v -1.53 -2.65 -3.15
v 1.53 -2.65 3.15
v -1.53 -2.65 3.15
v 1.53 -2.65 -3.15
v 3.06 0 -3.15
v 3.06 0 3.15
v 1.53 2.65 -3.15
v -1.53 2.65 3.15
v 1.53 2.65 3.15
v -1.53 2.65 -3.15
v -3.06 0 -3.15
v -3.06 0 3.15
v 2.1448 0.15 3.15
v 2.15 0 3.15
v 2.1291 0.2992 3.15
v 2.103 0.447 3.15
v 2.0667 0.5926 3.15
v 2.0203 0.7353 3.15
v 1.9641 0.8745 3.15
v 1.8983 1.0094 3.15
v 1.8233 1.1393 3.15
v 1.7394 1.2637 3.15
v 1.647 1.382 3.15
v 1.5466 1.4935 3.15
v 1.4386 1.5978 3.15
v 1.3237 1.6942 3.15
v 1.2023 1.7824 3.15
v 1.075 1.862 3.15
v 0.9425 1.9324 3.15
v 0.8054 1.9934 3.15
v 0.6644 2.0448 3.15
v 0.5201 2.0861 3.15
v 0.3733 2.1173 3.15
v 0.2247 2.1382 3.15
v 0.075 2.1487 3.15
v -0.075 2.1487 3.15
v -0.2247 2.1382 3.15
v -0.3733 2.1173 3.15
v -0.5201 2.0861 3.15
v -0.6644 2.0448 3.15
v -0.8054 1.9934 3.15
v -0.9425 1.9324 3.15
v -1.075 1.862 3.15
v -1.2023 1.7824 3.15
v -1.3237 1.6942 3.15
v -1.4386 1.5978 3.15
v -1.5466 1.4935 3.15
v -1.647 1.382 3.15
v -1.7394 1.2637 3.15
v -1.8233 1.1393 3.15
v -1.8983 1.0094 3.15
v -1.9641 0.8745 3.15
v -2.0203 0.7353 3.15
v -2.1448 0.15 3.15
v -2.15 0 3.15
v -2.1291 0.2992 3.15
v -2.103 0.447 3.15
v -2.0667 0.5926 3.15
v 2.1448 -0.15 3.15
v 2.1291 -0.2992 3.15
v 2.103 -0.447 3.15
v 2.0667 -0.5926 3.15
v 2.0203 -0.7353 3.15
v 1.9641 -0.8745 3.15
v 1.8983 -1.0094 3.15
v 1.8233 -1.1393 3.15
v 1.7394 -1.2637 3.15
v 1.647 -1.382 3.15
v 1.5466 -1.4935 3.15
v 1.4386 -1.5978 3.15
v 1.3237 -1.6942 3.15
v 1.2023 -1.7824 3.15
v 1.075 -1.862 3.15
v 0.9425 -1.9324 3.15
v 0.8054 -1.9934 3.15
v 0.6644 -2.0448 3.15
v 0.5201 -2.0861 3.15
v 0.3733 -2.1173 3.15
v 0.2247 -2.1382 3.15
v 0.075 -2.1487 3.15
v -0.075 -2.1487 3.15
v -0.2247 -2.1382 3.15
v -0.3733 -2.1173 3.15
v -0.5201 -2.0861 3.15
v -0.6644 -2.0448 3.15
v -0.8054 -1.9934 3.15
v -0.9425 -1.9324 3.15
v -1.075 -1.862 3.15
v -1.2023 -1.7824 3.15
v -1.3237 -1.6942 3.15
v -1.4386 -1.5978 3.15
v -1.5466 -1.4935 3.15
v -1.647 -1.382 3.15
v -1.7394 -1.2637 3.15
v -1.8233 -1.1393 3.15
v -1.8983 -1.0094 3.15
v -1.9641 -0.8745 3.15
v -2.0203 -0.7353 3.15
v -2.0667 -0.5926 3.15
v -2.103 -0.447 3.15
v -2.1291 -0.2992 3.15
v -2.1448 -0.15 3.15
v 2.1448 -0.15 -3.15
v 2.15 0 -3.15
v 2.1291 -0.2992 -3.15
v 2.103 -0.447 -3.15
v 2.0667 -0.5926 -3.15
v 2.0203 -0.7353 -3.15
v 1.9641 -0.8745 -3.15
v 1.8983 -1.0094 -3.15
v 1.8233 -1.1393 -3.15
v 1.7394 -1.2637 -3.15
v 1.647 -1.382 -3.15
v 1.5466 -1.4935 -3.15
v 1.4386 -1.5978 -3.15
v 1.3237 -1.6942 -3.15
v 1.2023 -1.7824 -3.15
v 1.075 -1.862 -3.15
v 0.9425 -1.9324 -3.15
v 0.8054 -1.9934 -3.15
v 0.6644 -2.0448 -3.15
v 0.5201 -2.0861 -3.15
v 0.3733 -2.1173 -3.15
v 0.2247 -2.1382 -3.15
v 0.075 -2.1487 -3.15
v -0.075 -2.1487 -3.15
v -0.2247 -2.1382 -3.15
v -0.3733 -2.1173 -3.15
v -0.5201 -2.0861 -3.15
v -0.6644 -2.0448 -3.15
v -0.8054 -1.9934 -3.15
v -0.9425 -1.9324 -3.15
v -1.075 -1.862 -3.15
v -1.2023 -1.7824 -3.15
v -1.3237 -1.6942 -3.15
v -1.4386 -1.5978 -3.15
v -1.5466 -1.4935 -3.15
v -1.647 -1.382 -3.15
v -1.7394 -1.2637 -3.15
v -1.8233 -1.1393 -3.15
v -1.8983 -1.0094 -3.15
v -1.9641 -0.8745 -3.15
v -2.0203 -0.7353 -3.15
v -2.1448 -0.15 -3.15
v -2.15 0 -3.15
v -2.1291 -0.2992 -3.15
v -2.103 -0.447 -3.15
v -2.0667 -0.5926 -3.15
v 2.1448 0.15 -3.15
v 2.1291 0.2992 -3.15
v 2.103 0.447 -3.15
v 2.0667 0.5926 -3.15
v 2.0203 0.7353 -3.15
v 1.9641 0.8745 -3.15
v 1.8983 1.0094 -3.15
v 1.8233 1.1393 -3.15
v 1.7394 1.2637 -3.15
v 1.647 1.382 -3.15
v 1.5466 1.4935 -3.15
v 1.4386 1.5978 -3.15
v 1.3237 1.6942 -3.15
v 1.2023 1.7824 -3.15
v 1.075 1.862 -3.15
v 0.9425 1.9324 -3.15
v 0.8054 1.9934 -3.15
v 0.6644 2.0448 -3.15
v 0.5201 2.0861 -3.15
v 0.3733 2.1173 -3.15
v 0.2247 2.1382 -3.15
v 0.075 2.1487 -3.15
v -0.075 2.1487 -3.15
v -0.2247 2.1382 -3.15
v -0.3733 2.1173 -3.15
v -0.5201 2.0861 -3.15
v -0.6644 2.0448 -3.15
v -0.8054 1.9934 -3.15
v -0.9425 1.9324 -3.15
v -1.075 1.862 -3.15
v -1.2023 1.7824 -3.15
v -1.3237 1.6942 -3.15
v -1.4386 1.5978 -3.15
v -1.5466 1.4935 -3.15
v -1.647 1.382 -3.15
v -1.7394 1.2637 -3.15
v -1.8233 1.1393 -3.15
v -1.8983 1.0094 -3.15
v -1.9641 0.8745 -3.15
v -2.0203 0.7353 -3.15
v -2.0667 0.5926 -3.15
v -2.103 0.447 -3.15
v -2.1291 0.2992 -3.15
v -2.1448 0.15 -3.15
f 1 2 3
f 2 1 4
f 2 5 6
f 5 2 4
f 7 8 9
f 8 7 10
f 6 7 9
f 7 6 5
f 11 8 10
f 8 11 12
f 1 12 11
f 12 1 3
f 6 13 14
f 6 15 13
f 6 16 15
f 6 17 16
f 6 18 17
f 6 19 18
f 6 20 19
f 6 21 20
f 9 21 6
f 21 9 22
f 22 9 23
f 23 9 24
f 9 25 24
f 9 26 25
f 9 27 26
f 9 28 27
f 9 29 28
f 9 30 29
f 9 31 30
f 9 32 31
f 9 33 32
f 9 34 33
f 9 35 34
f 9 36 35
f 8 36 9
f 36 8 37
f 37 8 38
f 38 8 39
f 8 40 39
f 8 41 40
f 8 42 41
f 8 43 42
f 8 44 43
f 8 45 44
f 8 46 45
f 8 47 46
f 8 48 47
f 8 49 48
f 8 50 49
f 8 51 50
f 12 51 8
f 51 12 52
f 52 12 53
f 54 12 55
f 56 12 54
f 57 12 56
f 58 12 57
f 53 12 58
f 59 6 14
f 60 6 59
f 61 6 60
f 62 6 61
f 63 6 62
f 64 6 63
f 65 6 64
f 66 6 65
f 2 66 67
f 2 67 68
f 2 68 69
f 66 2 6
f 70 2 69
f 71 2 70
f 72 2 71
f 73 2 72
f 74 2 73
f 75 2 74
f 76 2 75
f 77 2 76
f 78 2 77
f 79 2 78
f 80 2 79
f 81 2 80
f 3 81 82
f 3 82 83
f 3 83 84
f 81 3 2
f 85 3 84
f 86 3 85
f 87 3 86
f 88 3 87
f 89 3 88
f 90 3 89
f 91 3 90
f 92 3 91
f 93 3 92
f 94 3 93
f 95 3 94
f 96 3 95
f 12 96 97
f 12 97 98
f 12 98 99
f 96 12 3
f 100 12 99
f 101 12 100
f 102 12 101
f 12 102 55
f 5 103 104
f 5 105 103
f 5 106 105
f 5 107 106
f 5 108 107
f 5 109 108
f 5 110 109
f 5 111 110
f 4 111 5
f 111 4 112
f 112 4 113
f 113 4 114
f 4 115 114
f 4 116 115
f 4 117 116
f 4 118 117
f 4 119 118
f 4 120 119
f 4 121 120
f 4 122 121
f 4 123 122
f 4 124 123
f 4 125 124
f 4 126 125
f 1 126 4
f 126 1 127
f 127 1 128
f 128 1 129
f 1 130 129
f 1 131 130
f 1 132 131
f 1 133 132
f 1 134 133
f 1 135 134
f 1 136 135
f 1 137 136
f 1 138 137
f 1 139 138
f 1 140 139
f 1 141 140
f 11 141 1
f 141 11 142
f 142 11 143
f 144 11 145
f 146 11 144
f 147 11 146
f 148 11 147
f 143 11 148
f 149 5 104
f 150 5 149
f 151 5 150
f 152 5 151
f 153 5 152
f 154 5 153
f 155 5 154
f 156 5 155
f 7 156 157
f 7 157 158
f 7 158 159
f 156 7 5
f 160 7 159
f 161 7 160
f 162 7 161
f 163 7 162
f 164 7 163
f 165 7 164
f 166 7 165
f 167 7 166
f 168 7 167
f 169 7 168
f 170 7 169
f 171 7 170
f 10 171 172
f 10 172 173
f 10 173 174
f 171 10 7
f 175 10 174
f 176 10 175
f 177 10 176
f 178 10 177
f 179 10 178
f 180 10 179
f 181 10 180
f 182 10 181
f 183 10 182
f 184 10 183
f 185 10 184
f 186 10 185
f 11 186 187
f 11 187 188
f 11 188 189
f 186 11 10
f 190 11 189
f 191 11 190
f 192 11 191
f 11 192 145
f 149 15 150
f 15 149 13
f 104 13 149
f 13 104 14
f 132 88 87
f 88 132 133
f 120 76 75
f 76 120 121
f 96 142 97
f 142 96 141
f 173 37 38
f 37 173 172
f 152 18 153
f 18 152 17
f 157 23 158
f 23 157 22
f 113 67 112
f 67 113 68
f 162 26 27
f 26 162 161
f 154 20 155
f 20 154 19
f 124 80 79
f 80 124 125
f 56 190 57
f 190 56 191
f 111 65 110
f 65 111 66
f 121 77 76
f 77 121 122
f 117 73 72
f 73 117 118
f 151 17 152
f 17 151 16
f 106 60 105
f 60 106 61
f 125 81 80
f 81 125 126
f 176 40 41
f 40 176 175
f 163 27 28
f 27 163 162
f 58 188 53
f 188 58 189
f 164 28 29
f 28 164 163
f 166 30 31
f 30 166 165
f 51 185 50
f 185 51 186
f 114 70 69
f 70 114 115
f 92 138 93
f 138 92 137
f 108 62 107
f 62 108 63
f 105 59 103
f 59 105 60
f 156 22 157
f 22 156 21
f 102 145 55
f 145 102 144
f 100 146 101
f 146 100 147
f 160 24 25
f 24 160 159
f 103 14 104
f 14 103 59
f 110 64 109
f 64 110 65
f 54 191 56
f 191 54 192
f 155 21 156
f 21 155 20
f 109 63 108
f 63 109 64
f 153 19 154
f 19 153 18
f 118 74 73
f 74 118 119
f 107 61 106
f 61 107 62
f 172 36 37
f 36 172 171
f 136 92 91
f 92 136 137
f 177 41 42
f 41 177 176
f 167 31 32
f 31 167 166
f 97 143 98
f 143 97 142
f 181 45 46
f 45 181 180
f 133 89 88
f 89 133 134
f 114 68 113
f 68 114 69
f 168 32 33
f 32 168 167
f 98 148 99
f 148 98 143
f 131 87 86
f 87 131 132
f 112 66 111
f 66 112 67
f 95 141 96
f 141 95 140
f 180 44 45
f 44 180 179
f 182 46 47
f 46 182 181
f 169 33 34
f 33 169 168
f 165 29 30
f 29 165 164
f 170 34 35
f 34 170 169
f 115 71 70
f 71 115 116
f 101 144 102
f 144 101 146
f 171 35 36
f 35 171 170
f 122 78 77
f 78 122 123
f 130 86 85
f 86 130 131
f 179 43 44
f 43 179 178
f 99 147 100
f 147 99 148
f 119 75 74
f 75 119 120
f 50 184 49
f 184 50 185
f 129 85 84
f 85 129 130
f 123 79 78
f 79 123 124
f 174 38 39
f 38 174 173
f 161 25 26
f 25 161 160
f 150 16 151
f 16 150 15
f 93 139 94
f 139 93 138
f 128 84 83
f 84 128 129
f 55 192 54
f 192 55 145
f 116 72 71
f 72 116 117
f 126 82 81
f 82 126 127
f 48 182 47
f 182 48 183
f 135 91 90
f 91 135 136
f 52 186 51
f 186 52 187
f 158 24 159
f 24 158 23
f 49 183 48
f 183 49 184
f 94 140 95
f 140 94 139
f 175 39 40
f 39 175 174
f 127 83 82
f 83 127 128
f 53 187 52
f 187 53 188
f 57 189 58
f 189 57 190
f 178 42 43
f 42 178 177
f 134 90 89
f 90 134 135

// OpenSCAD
$fn = 120;

screw_d      = 4.0;   // nominal screw diameter
clearance    = 0.3;   // clearance for through-bore
hole_d       = screw_d + clearance;

across_flats = 5.3;   // hex width across flats
thickness    = 6.3;   // nut thickness

eps = 0.02;

module hex_prism_af(af, h) {
    // For a regular hexagon: across_flats = sqrt(3) * circumradius
    r = af / sqrt(3);
    cylinder(h = h, r = r, $fn = 6, center = true);
}

difference() {
    hex_prism_af(across_flats, thickness);
    cylinder(h = thickness + 2*eps, d = hole_d, $fn = 90, center = true);
}
